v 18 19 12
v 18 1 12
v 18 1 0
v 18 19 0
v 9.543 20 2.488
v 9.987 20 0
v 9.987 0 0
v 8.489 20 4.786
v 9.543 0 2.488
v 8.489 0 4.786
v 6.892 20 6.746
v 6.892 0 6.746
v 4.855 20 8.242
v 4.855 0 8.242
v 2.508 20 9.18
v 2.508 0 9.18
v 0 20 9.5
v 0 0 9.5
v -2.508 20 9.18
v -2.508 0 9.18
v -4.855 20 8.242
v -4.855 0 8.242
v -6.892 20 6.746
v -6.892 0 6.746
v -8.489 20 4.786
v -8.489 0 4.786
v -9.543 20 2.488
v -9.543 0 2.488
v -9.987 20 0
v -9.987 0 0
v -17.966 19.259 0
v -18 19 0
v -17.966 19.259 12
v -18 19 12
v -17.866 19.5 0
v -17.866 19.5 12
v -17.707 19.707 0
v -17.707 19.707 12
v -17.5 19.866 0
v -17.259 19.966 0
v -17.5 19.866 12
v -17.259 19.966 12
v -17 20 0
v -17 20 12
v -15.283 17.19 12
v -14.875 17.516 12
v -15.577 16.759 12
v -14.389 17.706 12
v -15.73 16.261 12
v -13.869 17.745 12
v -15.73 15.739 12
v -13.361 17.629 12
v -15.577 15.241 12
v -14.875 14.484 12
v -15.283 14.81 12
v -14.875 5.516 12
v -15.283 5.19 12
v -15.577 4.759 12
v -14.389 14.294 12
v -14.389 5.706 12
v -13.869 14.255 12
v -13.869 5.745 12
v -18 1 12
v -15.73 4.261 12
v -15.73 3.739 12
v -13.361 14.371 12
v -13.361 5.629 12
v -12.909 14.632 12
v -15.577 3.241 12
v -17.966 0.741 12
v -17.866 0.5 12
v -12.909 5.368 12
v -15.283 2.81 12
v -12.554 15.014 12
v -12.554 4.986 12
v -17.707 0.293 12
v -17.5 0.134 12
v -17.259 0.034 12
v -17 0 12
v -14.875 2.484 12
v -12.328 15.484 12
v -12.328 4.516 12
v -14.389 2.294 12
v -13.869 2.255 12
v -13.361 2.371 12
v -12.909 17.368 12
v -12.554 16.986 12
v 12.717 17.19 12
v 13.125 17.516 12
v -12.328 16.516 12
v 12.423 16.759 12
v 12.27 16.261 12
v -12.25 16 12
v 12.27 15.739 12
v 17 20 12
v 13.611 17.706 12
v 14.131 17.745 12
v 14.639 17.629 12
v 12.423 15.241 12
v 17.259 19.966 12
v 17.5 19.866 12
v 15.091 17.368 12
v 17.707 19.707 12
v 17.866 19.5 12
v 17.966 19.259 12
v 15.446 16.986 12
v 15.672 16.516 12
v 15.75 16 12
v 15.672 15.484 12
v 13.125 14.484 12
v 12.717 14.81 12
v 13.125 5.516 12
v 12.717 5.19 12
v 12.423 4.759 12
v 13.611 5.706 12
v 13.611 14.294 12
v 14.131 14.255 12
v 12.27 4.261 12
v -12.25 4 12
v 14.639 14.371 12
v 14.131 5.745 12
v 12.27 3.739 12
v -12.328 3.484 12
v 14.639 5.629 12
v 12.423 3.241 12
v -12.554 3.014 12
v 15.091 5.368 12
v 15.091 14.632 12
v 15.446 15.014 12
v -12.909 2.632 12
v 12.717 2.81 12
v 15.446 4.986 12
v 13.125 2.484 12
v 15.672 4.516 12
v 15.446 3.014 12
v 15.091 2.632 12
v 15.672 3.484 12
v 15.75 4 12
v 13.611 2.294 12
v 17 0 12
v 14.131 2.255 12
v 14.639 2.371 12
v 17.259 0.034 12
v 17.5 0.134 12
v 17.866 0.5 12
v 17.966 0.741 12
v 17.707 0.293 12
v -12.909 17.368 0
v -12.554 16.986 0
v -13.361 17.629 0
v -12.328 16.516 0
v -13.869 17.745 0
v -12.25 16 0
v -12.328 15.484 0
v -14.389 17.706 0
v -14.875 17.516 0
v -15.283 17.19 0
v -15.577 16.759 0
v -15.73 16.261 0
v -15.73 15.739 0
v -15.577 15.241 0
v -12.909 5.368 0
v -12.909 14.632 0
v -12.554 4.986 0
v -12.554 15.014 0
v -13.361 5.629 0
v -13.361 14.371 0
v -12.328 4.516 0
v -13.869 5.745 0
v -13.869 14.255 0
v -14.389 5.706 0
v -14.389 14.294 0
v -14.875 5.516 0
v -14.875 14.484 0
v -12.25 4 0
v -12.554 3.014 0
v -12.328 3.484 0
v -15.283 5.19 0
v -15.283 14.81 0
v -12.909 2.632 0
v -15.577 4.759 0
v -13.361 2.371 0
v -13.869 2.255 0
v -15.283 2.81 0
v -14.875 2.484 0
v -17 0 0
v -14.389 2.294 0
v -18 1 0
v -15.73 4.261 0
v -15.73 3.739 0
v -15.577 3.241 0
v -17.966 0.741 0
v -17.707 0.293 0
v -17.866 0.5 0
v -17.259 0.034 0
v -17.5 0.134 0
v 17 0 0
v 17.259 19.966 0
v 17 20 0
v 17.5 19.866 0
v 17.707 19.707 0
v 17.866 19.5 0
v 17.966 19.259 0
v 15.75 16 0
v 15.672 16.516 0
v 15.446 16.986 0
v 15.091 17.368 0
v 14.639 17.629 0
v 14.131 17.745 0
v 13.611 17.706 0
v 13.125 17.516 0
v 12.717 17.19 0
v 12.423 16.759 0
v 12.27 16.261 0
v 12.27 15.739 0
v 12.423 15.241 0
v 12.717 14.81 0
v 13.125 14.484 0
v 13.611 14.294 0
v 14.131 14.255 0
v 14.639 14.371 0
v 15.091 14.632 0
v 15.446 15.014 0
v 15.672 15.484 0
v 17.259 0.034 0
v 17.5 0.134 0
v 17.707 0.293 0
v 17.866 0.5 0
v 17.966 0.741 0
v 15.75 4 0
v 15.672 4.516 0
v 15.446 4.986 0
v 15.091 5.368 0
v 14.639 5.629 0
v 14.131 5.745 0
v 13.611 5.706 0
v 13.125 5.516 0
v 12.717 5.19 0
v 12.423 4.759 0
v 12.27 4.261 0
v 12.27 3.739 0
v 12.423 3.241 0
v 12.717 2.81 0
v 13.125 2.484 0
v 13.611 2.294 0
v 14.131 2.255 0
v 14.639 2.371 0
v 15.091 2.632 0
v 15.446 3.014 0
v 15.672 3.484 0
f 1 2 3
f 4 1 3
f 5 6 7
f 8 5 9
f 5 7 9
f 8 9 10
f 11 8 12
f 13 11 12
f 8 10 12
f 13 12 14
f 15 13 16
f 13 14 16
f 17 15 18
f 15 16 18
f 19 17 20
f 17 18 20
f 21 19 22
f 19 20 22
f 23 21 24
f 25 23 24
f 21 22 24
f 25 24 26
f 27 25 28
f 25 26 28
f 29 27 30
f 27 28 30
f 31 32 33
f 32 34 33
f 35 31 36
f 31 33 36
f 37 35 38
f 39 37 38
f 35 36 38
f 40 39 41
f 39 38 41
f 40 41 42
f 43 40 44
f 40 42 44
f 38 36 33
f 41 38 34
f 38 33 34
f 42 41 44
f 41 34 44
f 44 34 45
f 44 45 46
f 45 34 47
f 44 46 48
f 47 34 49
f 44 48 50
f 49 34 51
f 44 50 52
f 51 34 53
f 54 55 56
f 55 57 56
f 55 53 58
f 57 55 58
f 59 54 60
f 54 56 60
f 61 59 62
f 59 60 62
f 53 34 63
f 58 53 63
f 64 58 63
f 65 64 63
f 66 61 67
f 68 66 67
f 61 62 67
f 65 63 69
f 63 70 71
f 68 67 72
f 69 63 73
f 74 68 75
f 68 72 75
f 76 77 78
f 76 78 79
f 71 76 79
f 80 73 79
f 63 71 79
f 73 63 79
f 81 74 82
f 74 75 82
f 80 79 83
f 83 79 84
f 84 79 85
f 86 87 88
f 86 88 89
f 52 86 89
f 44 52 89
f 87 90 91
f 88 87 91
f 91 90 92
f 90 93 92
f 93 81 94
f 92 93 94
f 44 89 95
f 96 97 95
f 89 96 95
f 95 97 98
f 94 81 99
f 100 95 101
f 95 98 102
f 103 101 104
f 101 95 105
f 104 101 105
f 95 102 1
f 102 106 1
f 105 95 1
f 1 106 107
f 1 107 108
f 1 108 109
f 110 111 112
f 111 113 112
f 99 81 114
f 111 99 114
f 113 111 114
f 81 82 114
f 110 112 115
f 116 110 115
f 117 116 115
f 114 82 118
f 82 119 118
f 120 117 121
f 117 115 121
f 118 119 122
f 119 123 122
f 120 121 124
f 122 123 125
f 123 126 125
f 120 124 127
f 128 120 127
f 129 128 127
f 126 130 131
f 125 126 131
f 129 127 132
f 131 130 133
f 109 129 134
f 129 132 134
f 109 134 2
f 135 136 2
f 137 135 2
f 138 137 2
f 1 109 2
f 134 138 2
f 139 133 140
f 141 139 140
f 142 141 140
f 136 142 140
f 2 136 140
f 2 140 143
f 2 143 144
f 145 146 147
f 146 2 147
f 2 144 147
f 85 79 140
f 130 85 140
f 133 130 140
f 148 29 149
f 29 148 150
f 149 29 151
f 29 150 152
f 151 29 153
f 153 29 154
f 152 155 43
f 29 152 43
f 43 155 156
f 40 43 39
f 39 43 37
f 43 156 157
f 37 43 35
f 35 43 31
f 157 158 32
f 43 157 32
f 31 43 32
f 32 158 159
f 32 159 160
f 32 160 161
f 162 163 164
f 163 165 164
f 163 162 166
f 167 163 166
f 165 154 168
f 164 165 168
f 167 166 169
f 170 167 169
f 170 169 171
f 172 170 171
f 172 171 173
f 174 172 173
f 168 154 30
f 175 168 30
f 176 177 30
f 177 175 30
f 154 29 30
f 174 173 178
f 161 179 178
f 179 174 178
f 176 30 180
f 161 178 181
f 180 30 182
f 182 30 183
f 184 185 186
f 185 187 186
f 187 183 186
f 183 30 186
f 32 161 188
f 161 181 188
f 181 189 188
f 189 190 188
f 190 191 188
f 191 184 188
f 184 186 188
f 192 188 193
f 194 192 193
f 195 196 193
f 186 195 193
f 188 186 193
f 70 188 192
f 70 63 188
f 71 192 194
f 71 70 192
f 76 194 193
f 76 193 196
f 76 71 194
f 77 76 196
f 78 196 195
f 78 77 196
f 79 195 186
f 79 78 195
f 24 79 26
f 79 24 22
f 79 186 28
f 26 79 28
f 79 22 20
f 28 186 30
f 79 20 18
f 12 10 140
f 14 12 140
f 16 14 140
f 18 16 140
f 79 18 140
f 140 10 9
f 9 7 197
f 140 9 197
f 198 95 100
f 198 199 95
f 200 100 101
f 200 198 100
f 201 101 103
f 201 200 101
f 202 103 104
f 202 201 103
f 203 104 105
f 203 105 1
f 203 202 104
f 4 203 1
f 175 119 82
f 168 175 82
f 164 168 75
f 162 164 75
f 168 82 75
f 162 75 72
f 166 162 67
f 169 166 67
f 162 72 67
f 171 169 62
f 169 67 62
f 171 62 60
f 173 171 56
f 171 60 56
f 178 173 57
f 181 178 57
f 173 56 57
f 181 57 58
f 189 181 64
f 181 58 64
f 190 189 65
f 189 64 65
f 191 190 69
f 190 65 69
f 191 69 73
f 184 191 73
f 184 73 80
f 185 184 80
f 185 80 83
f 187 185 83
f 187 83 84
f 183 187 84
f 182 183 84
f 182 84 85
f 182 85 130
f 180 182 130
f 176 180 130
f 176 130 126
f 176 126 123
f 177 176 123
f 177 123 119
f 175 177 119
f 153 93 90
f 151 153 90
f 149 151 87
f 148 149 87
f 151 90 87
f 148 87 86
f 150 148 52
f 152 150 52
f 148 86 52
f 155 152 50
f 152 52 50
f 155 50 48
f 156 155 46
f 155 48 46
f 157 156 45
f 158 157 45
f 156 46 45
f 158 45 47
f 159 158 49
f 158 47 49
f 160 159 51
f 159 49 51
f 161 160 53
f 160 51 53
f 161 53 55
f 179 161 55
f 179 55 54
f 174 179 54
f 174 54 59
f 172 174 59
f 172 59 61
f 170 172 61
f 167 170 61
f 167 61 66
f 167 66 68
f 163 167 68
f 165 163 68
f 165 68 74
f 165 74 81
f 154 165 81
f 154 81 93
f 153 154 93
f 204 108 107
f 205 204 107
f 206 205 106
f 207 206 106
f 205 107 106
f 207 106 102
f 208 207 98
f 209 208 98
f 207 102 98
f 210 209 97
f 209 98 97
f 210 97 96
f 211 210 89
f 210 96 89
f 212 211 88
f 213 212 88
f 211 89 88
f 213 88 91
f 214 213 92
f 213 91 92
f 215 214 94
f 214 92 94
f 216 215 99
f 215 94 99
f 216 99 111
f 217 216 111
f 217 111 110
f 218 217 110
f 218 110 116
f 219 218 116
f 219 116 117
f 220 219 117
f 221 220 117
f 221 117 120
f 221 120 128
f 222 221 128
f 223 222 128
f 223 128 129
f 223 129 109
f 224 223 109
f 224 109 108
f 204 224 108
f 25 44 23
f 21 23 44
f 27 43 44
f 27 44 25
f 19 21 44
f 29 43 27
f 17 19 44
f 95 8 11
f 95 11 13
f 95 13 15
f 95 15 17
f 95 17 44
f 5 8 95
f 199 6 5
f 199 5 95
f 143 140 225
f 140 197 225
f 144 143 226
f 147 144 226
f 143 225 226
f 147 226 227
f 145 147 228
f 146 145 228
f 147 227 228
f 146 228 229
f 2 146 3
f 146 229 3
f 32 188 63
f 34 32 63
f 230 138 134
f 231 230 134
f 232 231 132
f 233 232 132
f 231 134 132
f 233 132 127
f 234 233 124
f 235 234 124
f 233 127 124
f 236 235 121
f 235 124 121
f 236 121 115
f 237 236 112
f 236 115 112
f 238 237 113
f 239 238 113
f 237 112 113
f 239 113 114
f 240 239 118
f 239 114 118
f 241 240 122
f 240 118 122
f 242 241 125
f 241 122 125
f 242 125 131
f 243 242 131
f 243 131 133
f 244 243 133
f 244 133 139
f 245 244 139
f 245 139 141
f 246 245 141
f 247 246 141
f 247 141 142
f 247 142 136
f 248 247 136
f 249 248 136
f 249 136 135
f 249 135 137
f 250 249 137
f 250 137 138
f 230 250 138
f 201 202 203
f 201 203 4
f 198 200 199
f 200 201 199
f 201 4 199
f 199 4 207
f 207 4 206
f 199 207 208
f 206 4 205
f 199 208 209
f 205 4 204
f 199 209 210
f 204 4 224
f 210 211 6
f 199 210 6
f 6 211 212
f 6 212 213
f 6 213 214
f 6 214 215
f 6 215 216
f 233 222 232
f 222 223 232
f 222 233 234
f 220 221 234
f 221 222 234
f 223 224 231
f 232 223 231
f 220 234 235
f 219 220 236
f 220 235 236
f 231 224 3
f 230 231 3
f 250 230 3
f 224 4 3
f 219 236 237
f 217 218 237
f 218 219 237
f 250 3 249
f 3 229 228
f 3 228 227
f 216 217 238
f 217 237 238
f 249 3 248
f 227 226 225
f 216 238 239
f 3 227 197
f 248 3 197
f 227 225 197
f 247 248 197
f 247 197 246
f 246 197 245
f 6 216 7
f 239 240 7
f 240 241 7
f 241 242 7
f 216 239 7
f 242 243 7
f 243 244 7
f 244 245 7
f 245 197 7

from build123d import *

# Parameters (mm, degrees)
BOSS_EXTRUDE1_DEPTH = 20
SKETCH2_R           = 1.75
CUT_EXTRUDE1_DEPTH  = 13
FILLET1_R           = 1


with BuildPart() as part:
    # Sketch1 → Boss-Extrude1 (new body)
    with BuildSketch(Plane(origin=(0, 0, 0), x_dir=(1, 0, 0), z_dir=(0, 1, 0))):
        with BuildLine():
            Line((-18, 0), (-18, -12))
            Line((-18, -12), (18, -12))
            Line((18, -12), (18, 0))
            Line((18, 0), (9.987492178, 0))
            ThreePointArc((9.987492178, 0), (0, -9.5), (-9.987492178, 0))
            Line((-9.987492178, 0), (-18, 0))
        make_face()
    extrude(amount=BOSS_EXTRUDE1_DEPTH)

    # Sketch2 → Cut-Extrude1 (cut, through all)
    with BuildSketch(Plane.XY.offset(12)):
        with Locations((-14, 16)):
            Circle(SKETCH2_R)
        with Locations((-14, 4)):
            Circle(SKETCH2_R)
        with Locations((14, 4)):
            Circle(SKETCH2_R)
        with Locations((14, 16)):
            Circle(SKETCH2_R)
    extrude(amount=-CUT_EXTRUDE1_DEPTH, mode=Mode.SUBTRACT)

    # Fillet1
    fillet1_edges = [part.edges().sort_by_distance(p)[0] for p in [
        (-18, 20, 6),
        (-18, 0, 6),
        (18, 0, 6),
        (18, 20, 6),
    ]]
    fillet(fillet1_edges, radius=FILLET1_R)


solid = part.part
